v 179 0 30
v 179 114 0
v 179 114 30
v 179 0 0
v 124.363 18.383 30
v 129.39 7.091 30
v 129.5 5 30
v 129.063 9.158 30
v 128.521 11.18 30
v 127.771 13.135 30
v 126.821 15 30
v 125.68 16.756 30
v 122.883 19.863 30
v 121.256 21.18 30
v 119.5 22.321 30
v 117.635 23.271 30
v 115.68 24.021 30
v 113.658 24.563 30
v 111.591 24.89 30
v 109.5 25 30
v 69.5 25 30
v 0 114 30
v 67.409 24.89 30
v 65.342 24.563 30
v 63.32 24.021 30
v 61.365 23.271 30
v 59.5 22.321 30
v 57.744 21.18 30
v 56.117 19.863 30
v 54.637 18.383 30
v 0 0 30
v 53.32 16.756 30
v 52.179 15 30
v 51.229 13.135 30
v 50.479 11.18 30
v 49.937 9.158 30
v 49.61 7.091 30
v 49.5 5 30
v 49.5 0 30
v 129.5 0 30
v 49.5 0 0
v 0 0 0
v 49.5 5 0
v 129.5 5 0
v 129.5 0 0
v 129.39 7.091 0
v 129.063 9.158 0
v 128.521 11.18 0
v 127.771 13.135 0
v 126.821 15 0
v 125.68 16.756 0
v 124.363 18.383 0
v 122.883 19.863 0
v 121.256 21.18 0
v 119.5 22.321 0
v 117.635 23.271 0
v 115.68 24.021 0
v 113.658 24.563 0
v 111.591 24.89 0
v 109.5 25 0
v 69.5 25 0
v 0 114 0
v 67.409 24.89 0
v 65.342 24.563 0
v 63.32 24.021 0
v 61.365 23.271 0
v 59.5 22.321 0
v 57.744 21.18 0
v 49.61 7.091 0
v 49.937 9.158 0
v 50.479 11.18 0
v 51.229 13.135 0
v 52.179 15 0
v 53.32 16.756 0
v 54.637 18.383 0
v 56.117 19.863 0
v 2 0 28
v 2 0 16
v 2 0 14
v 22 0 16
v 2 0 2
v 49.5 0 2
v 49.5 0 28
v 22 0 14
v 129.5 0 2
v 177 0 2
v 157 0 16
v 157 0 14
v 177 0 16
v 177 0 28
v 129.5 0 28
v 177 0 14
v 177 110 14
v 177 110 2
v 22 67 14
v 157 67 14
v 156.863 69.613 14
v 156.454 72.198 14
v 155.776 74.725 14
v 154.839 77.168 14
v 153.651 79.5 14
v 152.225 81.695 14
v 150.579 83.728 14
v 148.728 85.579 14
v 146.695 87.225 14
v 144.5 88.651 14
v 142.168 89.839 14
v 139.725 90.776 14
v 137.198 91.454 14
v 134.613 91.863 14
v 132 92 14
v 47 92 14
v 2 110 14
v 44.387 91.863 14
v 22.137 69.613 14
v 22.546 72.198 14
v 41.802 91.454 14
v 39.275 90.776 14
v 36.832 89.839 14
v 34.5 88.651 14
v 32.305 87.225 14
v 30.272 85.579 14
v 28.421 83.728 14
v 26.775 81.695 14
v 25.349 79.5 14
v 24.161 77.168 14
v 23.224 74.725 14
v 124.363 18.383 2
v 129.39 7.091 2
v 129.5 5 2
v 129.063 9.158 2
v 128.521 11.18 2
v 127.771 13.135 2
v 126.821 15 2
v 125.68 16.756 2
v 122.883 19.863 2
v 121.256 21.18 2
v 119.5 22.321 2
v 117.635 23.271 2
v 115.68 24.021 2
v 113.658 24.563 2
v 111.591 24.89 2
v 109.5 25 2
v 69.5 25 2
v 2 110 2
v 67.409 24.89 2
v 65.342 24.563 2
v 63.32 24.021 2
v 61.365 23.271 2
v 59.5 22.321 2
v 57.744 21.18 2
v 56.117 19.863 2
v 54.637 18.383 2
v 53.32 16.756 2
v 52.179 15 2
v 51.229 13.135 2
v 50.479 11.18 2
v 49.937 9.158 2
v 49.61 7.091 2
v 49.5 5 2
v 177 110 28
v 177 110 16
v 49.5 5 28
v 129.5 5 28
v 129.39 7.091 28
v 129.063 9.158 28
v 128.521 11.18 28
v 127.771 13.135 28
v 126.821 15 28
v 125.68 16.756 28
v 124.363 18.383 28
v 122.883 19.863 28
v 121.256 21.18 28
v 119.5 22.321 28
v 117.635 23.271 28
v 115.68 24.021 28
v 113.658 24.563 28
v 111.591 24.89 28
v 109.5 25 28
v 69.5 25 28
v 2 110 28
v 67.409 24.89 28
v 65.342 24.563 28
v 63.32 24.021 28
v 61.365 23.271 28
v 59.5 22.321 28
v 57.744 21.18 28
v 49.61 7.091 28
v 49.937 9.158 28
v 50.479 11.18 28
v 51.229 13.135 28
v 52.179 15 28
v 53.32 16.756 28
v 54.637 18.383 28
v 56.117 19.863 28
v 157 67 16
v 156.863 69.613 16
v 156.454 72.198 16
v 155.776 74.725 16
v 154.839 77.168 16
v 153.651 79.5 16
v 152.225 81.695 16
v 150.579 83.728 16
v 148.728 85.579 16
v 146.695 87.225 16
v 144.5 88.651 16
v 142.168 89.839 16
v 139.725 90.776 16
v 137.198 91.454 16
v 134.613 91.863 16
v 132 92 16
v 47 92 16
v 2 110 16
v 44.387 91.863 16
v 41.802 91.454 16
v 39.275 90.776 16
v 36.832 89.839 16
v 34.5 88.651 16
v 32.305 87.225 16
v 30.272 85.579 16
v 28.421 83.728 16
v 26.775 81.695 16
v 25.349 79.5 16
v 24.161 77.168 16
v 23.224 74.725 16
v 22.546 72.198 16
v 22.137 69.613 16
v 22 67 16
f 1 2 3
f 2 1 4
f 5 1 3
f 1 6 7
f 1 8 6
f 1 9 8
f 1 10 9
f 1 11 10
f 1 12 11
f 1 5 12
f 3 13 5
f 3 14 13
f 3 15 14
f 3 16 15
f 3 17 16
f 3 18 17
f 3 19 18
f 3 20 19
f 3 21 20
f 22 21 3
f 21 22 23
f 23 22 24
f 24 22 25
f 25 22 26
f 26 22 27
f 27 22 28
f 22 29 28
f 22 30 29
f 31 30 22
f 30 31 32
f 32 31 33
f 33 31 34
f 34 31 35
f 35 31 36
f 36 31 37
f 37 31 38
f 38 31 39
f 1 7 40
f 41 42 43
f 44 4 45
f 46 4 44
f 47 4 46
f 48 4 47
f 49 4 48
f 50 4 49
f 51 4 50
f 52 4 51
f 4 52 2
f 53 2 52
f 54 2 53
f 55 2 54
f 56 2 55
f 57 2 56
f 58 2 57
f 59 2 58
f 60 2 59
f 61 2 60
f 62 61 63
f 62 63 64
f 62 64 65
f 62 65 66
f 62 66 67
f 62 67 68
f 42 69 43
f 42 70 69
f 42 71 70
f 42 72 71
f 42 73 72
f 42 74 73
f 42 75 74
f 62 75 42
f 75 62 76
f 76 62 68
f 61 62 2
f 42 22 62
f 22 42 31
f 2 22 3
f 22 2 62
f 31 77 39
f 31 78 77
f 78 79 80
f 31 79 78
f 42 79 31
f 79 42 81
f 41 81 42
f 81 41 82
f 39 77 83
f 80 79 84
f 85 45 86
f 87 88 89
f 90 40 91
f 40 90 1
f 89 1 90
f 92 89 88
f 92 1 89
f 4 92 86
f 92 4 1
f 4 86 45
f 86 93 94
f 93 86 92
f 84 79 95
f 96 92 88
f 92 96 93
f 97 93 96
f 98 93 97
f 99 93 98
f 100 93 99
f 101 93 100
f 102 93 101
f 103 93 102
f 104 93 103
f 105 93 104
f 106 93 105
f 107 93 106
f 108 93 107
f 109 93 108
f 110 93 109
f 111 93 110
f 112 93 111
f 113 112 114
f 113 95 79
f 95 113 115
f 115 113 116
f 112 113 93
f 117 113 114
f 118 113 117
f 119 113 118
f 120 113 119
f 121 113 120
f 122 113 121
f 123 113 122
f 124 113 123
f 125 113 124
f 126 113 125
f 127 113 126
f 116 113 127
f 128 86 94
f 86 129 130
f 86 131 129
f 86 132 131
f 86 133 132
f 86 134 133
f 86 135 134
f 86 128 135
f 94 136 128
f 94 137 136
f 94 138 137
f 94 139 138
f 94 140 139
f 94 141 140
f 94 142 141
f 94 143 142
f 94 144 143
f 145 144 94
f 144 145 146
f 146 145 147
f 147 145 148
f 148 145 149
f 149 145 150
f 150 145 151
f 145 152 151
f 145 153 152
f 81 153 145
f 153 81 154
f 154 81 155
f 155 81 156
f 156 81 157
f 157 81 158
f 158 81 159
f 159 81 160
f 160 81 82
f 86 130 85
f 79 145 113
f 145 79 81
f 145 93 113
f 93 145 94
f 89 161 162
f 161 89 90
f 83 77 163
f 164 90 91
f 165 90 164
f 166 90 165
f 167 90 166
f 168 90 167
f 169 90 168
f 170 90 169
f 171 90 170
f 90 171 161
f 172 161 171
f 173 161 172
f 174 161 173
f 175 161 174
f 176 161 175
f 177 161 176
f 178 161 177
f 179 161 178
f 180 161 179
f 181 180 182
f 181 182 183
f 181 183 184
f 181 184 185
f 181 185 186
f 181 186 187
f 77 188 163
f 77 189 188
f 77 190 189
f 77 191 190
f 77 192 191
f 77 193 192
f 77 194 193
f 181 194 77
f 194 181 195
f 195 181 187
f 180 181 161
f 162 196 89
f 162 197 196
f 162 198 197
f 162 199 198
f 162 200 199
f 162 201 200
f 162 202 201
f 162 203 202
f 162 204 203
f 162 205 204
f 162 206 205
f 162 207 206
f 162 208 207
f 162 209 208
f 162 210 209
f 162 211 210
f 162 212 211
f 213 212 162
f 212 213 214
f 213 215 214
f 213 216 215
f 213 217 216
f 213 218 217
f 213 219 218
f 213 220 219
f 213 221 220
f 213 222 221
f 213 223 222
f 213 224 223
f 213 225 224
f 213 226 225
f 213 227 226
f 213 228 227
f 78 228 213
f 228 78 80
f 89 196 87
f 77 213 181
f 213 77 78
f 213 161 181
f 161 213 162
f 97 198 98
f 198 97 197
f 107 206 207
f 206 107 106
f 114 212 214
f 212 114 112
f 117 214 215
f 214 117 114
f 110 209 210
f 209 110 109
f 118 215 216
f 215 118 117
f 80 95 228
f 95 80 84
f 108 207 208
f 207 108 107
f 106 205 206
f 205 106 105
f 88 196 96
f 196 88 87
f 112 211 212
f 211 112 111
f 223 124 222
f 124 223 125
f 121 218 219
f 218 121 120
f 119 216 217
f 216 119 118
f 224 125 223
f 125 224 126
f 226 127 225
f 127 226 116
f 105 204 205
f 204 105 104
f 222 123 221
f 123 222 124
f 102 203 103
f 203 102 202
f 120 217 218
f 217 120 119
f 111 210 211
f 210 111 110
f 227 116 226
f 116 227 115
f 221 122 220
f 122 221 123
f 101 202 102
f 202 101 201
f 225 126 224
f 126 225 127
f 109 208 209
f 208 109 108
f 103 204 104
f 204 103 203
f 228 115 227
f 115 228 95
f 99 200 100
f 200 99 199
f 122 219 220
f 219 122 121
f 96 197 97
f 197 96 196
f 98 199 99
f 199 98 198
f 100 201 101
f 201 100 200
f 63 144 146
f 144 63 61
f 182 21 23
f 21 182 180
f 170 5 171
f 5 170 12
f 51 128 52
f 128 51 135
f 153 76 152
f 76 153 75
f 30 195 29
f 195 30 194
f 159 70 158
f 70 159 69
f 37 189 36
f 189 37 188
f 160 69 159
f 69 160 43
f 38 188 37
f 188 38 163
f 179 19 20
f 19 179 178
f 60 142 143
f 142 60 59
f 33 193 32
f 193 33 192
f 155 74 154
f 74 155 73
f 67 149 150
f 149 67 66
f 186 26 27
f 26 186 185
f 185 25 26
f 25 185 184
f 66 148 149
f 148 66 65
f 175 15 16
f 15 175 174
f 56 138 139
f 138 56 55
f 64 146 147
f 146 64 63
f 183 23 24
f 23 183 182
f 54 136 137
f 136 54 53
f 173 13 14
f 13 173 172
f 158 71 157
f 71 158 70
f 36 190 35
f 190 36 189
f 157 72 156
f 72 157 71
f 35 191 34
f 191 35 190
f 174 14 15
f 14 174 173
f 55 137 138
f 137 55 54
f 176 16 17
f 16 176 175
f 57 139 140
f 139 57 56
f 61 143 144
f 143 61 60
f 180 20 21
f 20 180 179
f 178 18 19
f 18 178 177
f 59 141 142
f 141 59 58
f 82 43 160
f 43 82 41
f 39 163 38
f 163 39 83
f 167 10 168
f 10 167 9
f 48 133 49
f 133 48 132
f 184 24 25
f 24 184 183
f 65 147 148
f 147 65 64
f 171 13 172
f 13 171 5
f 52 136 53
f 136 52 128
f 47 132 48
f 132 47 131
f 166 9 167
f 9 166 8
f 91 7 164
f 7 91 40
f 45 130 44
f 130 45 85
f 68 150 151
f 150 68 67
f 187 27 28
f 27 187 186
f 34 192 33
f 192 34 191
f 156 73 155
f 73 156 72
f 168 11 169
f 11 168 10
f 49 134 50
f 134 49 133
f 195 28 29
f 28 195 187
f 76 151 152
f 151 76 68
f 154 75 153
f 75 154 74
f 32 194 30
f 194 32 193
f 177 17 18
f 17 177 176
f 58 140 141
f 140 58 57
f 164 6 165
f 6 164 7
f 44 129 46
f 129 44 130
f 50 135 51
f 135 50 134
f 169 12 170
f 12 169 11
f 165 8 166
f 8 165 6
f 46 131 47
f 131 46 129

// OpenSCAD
// file: rounded_rect.scad
// module for a rounded rectangle
// 14.11.2025
// Sebastian Weigl

module rr(l, w, r, h)
{
linear_extrude(height = h, center = false, convexity = 0)
  translate([r, r, 0])
  offset(r=r, $fn = 60) 
  square([l-(2*r), w-(2*r)]);
}

// to use this add
// use <rounded_rect.scad>
// and 
// rr(x_length,y_length,radius,height);
// main file
// simple stand for
// nintendo switch games
// version 2
// 08.04.2026 Sebastian Weigl

// // rr(x_length,y_length,radius,height);
$fn=64;
include <rounded_rect.scad>

border = 2;

difference(){
// outer form
cube([179,114,30],false);
// box form 1
translate([border,0,border])
cube([175,110,12],false);
// box form 2
translate([border,0,16])
cube([175,110,12],false);
// inner form
translate([22,-58,2])
rr(135,150,25,17);
// grip form
translate([49.5,-25,0])
#rr(80,50,20,30);
// cutout back
//translate([29.5,116,5])
//rotate([90,0,0])
//rr(120,146,25,35);
}
